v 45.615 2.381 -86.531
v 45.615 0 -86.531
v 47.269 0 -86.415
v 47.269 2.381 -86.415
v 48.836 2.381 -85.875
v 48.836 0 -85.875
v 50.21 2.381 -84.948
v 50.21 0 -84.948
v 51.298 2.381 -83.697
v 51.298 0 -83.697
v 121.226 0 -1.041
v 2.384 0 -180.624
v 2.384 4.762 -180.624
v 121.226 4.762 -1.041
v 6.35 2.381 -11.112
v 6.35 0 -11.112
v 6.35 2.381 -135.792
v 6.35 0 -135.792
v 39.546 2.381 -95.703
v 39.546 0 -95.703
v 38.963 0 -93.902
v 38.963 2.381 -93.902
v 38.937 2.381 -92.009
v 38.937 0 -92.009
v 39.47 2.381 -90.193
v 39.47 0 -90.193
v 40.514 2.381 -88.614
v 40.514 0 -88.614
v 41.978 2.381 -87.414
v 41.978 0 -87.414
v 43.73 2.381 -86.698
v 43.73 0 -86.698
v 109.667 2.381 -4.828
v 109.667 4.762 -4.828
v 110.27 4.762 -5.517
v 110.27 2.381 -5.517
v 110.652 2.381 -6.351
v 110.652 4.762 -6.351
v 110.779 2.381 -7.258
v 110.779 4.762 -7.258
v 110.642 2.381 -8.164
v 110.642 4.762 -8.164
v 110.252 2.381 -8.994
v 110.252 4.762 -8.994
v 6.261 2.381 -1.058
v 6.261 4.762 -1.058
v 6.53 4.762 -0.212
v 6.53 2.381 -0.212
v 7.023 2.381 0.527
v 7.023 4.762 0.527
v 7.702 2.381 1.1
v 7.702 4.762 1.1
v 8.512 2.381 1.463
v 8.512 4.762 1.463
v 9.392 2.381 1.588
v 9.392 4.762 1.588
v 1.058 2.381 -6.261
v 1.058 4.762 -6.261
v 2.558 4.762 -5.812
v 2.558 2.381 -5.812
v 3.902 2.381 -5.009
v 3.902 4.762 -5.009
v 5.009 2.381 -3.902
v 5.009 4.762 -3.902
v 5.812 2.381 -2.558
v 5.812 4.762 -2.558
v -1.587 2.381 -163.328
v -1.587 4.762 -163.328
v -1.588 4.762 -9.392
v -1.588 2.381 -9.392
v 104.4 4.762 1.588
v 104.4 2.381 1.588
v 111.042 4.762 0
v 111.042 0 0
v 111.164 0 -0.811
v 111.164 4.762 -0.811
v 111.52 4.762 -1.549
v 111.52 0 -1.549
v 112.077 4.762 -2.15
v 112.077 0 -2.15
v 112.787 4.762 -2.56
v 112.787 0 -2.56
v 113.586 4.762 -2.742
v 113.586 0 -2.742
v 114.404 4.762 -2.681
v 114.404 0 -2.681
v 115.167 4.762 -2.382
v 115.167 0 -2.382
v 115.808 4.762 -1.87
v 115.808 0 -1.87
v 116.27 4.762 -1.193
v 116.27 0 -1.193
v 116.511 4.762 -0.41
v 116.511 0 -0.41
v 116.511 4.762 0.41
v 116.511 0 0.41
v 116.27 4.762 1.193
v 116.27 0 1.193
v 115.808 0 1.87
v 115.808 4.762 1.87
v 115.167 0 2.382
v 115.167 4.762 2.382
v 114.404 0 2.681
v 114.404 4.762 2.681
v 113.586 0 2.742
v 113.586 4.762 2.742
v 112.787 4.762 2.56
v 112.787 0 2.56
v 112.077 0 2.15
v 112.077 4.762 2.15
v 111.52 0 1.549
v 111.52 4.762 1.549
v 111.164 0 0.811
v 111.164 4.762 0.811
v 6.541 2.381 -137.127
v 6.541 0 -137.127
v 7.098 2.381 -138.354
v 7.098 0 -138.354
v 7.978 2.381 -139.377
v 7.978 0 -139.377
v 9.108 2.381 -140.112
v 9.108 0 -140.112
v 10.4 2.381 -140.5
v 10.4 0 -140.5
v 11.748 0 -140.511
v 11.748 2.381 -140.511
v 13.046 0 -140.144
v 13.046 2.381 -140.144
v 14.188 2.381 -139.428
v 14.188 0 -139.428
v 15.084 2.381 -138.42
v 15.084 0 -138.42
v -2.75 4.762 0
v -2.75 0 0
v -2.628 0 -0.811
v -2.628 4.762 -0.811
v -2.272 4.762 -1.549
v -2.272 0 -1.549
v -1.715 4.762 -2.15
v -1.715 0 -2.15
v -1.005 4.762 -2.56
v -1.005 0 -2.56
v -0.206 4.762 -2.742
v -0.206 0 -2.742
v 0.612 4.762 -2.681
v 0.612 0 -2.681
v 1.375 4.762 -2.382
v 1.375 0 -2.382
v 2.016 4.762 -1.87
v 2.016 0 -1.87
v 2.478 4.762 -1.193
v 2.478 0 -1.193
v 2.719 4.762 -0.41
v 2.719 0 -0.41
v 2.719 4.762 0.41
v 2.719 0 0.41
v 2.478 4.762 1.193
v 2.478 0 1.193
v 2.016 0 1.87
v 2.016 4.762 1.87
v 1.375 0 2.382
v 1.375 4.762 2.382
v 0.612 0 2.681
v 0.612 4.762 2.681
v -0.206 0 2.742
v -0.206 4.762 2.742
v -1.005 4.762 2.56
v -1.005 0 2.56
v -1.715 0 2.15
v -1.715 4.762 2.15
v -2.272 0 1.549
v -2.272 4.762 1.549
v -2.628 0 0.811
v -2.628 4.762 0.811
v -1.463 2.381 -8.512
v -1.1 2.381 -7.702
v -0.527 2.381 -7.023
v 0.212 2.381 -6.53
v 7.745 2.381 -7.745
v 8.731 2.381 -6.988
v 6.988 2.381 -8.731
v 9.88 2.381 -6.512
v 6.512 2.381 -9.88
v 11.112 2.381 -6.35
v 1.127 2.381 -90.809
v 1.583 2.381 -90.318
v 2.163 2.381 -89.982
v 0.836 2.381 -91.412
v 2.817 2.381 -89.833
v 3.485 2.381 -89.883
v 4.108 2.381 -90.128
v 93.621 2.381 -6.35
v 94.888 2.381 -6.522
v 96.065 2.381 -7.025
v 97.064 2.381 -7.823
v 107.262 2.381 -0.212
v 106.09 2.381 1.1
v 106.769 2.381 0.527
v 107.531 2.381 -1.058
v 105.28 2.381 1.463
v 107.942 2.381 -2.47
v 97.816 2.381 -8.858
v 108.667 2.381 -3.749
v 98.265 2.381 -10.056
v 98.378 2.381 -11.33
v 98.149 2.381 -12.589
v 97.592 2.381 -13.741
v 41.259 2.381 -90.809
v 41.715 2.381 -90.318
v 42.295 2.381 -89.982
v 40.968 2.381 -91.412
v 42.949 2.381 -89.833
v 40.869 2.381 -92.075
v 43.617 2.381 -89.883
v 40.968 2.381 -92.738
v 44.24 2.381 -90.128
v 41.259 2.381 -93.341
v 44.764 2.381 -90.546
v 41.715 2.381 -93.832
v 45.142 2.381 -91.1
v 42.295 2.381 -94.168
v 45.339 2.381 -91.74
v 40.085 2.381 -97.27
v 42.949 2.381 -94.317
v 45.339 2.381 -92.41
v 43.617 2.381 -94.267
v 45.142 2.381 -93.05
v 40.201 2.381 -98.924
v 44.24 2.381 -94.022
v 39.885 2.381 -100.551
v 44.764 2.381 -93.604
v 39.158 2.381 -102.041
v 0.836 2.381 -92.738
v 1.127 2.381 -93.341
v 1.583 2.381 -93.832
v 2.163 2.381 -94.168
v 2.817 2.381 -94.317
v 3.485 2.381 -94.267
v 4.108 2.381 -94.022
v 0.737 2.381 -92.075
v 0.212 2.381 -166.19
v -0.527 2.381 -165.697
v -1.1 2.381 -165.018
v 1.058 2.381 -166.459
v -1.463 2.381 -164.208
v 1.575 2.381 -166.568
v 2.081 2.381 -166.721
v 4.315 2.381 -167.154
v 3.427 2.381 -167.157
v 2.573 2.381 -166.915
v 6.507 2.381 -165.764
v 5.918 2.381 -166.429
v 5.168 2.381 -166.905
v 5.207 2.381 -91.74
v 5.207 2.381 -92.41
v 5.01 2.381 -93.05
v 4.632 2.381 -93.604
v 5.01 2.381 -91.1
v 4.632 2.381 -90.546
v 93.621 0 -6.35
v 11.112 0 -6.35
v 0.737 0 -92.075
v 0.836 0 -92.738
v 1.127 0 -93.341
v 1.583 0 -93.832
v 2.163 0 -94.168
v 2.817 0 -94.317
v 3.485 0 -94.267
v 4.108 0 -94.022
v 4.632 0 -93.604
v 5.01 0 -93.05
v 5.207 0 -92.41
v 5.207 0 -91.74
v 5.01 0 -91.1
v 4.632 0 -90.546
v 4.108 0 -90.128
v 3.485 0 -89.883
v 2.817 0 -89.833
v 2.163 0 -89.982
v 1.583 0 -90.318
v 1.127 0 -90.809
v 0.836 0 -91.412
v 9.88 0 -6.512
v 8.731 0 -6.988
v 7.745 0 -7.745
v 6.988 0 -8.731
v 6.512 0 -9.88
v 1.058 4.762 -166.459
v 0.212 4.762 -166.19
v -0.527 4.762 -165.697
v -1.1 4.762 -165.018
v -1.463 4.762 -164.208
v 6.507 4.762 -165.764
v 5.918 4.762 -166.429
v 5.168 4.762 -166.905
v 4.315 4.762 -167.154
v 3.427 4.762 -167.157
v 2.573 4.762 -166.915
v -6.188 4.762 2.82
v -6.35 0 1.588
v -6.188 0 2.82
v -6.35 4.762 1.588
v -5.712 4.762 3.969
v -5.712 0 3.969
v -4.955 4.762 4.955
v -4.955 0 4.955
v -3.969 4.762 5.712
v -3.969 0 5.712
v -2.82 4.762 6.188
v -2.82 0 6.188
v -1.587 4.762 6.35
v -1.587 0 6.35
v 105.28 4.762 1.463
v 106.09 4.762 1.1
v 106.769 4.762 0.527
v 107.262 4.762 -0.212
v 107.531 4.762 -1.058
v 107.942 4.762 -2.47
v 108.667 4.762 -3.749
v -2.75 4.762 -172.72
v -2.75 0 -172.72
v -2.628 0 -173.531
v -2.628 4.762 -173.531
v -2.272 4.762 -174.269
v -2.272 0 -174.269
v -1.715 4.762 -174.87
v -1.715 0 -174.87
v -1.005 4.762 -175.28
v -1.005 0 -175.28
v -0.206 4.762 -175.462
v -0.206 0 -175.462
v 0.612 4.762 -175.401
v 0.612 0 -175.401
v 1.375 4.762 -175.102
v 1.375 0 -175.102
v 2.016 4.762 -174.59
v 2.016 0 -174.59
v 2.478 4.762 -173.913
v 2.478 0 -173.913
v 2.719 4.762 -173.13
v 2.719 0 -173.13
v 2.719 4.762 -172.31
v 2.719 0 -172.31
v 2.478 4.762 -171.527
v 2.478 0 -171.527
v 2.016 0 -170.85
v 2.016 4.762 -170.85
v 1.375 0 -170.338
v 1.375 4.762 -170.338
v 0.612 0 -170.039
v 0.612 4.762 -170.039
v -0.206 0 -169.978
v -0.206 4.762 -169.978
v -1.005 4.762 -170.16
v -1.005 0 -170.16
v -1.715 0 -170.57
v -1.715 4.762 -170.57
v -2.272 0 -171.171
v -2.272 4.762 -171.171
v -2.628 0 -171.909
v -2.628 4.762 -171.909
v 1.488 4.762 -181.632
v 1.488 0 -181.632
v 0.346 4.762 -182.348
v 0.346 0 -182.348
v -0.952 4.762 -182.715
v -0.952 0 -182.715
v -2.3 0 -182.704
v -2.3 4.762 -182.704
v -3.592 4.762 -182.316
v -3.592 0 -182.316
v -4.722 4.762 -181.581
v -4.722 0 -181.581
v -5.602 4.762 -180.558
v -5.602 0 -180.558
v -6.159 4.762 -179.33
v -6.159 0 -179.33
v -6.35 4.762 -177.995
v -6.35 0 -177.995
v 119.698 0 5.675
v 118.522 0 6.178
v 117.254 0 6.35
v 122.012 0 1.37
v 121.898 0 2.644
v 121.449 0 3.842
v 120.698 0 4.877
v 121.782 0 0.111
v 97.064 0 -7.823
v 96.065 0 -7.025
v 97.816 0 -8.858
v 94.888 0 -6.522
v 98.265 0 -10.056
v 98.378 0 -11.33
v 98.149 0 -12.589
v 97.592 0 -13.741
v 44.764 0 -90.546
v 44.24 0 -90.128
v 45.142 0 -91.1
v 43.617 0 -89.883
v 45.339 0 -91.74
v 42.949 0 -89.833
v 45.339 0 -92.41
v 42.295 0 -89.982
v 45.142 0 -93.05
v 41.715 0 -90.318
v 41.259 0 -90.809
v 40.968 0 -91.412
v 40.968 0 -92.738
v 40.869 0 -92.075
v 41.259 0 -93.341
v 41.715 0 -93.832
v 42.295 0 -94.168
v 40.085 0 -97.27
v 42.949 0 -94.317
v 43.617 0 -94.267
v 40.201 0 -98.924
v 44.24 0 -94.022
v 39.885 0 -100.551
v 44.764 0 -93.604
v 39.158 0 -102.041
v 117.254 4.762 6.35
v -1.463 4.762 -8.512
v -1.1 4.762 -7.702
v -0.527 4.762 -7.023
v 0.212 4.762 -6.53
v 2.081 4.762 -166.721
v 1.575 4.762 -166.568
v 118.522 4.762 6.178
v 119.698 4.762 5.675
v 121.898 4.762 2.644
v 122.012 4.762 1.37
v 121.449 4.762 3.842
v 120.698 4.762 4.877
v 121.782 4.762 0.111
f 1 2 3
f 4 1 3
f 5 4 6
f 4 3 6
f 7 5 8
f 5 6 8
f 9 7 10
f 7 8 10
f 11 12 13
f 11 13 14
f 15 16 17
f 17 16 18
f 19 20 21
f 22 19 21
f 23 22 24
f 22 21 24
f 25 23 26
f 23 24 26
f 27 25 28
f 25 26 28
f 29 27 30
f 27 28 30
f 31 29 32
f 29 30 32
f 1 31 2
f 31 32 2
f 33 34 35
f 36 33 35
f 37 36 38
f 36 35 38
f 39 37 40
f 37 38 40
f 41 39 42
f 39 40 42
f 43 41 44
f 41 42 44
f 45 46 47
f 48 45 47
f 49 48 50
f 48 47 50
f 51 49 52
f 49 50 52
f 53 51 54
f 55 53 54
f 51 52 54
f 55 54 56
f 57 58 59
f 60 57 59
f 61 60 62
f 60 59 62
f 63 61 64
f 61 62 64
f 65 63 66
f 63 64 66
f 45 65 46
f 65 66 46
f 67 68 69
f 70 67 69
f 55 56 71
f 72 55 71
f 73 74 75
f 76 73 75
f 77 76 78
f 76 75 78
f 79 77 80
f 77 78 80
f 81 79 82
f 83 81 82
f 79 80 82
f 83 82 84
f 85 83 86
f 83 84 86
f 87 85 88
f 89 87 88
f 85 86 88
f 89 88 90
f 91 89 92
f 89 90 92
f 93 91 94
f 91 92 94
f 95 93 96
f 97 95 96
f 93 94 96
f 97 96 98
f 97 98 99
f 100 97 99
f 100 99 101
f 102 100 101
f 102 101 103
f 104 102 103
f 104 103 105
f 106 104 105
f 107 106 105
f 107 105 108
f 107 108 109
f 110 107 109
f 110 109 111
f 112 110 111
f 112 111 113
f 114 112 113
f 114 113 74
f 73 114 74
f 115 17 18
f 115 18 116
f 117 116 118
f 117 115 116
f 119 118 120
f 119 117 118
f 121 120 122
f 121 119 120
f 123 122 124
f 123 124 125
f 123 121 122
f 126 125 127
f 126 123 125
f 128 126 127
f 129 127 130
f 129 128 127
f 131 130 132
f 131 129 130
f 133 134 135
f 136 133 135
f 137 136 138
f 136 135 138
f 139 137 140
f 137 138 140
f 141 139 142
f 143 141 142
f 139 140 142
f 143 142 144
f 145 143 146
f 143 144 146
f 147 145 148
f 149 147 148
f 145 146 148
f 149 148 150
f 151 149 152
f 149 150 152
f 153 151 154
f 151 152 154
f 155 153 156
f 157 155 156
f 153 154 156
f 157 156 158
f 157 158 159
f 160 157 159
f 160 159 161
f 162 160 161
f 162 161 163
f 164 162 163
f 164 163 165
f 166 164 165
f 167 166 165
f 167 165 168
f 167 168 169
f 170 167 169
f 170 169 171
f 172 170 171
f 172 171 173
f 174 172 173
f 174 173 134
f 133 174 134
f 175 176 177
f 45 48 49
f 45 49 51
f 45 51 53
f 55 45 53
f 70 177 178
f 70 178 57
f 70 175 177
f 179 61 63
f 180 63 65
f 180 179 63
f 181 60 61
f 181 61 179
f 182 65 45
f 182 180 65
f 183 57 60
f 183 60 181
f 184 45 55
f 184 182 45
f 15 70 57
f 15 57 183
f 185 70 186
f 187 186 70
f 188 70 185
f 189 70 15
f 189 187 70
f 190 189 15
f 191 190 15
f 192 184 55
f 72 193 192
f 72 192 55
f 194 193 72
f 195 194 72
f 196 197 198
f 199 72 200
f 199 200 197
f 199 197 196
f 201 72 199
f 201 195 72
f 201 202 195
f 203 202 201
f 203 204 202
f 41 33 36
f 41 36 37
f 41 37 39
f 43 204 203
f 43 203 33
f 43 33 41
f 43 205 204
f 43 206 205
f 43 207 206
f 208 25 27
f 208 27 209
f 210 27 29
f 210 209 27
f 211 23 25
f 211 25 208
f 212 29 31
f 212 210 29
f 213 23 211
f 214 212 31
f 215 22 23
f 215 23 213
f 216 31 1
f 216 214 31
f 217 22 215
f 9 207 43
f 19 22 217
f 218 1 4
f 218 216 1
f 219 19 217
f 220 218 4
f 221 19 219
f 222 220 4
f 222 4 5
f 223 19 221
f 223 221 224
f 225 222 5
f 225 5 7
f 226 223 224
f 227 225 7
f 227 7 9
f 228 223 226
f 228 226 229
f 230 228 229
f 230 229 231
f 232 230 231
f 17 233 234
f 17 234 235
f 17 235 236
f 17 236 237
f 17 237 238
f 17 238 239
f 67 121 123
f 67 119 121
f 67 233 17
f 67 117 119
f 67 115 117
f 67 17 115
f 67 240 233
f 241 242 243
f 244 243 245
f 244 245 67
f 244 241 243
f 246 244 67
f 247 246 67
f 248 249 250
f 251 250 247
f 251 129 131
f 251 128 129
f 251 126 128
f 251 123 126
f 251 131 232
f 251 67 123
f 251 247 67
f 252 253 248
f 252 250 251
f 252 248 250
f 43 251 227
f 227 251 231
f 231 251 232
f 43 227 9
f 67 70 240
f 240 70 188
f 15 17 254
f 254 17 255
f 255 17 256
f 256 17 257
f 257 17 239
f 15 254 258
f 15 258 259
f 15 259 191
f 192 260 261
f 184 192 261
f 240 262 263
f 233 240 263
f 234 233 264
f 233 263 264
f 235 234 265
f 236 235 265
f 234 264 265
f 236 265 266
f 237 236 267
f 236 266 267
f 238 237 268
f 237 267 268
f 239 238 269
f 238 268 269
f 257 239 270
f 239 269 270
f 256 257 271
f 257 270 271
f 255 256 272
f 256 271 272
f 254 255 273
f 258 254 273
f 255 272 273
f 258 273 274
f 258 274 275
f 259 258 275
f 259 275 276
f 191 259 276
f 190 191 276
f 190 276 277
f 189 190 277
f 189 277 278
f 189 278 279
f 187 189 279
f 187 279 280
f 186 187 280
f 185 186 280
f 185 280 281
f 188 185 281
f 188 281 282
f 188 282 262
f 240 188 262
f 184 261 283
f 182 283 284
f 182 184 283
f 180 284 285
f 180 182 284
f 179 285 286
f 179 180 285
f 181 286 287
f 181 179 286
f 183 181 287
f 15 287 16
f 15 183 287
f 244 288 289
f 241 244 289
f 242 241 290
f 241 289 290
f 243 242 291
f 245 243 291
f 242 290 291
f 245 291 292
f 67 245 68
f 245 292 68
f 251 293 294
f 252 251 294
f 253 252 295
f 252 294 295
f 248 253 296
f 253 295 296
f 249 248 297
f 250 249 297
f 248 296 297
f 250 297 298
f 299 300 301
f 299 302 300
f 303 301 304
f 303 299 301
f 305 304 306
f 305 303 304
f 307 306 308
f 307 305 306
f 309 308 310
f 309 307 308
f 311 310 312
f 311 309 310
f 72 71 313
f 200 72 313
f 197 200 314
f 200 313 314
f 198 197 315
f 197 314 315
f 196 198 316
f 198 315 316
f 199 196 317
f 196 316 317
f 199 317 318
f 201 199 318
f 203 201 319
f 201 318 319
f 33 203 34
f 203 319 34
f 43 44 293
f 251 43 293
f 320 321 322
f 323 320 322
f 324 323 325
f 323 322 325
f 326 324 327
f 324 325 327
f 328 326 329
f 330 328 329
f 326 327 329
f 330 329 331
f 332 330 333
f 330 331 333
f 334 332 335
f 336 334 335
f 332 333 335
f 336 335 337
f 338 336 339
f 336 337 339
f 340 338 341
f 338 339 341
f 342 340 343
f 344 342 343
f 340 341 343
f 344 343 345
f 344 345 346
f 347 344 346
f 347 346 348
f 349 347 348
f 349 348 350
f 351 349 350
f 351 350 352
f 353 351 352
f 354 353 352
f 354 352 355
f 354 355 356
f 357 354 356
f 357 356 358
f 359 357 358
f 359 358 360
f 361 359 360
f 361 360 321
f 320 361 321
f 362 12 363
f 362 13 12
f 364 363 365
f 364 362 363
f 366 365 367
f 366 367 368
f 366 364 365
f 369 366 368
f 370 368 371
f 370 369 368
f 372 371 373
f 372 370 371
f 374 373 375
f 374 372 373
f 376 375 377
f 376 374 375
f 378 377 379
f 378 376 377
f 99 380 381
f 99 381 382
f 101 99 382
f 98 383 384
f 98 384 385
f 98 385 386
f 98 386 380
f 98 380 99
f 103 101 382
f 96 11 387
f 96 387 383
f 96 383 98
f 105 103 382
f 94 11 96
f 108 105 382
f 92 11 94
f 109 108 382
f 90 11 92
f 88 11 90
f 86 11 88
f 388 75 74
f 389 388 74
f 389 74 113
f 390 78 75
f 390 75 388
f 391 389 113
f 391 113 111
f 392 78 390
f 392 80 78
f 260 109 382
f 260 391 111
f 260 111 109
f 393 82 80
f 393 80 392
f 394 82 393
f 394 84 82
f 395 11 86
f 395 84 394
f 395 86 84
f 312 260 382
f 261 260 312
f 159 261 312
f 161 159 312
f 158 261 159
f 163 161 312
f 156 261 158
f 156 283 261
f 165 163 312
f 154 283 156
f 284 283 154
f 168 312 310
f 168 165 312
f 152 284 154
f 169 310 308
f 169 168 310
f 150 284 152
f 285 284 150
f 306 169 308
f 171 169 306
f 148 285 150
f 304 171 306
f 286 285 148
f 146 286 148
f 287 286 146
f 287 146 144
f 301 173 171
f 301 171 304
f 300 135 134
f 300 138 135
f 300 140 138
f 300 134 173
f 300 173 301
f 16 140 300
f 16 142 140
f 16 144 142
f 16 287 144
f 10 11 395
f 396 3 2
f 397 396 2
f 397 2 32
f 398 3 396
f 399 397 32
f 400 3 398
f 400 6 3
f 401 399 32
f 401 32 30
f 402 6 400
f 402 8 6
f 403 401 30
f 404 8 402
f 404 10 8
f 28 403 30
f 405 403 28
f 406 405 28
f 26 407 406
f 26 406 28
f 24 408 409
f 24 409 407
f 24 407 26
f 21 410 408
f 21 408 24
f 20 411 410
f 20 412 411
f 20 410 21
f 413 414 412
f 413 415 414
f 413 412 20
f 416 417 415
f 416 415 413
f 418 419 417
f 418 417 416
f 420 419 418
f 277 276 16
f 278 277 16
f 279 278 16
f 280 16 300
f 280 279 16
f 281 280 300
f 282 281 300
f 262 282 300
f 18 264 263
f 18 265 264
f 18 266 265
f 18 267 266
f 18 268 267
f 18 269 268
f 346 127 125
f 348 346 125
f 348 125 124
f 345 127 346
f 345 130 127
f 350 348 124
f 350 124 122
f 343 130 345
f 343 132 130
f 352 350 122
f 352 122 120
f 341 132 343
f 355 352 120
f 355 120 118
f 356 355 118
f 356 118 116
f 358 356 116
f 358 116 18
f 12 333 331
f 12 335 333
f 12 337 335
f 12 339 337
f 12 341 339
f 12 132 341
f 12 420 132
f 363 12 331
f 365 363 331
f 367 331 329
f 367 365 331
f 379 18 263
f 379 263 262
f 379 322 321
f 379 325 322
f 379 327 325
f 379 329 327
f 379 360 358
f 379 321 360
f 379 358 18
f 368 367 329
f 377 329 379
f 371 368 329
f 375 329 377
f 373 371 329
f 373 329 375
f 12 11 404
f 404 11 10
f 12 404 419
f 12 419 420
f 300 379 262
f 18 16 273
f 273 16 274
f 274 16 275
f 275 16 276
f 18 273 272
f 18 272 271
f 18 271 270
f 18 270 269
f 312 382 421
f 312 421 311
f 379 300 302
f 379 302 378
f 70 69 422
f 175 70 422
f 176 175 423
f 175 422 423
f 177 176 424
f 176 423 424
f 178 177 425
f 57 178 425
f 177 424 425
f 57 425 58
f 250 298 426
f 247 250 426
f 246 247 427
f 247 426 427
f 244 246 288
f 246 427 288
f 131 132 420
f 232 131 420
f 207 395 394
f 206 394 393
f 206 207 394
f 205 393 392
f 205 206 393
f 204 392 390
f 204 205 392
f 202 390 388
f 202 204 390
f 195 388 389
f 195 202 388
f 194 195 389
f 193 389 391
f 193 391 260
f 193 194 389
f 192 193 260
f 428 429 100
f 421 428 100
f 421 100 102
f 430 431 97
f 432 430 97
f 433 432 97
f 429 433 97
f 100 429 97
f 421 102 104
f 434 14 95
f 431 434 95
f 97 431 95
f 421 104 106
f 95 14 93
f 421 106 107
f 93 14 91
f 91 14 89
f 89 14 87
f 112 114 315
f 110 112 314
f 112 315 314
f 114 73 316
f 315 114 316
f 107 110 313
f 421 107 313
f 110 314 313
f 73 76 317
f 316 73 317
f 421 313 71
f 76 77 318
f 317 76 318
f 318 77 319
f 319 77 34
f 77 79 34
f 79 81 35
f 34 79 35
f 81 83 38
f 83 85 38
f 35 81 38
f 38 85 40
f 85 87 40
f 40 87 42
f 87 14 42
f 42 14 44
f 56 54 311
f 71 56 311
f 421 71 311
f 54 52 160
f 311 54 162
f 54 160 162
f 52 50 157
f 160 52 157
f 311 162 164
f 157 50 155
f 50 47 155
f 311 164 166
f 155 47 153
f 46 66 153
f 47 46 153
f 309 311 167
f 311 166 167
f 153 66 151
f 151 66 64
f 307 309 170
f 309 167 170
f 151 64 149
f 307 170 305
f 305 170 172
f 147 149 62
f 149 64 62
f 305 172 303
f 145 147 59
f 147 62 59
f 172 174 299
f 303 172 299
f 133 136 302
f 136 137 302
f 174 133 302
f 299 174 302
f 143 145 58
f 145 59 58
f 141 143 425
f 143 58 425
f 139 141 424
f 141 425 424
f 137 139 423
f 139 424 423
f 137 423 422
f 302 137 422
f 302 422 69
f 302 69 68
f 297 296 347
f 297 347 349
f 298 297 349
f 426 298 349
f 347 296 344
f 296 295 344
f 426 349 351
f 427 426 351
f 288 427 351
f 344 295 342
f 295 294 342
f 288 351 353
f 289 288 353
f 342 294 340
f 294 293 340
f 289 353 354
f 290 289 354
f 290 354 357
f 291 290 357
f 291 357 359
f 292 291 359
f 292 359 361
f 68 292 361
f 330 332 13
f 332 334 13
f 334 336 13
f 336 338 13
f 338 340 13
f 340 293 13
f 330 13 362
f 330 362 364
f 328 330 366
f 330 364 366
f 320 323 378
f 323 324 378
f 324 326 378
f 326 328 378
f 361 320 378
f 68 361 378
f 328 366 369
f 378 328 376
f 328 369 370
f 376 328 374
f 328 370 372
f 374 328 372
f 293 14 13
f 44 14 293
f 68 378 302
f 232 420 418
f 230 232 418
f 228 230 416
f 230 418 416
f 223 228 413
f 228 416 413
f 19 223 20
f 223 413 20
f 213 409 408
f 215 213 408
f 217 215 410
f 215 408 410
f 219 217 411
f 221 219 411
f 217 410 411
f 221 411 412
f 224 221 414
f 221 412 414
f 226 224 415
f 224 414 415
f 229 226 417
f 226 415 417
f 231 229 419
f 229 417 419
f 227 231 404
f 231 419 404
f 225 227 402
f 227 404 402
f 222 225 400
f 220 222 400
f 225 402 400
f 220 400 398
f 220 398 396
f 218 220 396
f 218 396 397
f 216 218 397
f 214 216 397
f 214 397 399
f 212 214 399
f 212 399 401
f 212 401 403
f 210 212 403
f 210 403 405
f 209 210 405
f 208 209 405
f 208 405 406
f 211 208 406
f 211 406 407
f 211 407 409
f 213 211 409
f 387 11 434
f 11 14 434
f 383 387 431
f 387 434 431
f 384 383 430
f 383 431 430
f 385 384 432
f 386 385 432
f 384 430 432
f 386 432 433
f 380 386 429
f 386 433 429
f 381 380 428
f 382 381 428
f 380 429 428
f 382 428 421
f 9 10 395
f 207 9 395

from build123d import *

# Parameters (mm, degrees)
BOSS_EXTRUDE1_DEPTH          = 4.7625
FILLET5_R                    = 4.7625
F_97_0_0059_DIAMETER_HOLE1_D = 5.499999922
CUT_EXTRUDE1_DEPTH           = 2.38125
F_8_CLEARANCE_HOLE1_D        = 4.4958


with BuildPart() as part:
    # Sketch1 → Boss-Extrude1 (new body)
    with BuildSketch(Plane(origin=(0, 0, 0), x_dir=(1, 0, 0), z_dir=(0, 1, 0))):
        Polygon((-6.35, 193.821953186), (126.116733726, -6.35), (-6.35, -6.35), align=None)
        with BuildLine():
            Line((51.297931724, 83.696727765), (102.483266274, 6.35))
            Line((102.483266274, 6.35), (6.35, 6.35))
            Line((6.35, 6.35), (6.35, 151.618046814))
            Line((6.35, 151.618046814), (39.158490531, 102.040772235))
            ThreePointArc((39.158490531, 102.040772235), (40.201209552, 98.92354296), (39.545616076, 95.702583707))
            ThreePointArc((39.545616076, 95.702583707), (39.932741621, 89.36439518), (45.615336672, 86.530561472))
            ThreePointArc((45.615336672, 86.530561472), (48.836295925, 85.874967996), (51.297931724, 83.696727765))
        make_face(mode=Mode.SUBTRACT)
    extrude(amount=BOSS_EXTRUDE1_DEPTH)

    # Fillet5
    fillet5_edges = [part.edges().sort_by_distance(p)[0] for p in [
        (6.35, 2.38125, -151.618046814),
        (6.35, 2.38125, -6.35),
        (102.483266274, 2.38125, -6.35),
        (-6.35, 2.38125, -193.821953186),
        (126.116733726, 2.38125, 6.35),
        (-6.35, 2.38125, 6.35),
    ]]
    fillet(fillet5_edges, radius=FILLET5_R)

    # #97 (0.0059) Diameter Hole1 (through all)
    with Locations(Plane(origin=(0, 4.7625, 0), x_dir=(1, 0, 0), z_dir=(0, 1, 0))):
        with Locations((0, 172.72), (0, 0), (113.792, 0)):
            Hole(F_97_0_0059_DIAMETER_HOLE1_D / 2)

    # Sketch5 → Cut-Extrude1 (cut)
    with BuildSketch(Plane(origin=(0, 4.7625, 0), x_dir=(1, 0, 0), z_dir=(0, 1, 0))):
        with BuildLine():
            Line((110.252008963, 8.993563641), (6.506878053, 165.763983683))
            ThreePointArc((6.506878053, 165.763983683), (4.750358466, 167.059159309), (2.5727622, 166.914537515))
            ThreePointArc((2.5727622, 166.914537515), (1.829790785, 166.639344963), (1.058333333, 166.458815563))
            ThreePointArc((1.058333333, 166.458815563), (-0.837446305, 165.377677032), (-1.5875, 163.328223344))
            Line((-1.5875, 163.328223344), (-1.5875, 9.391776656))
            ThreePointArc((-1.5875, 9.391776656), (-0.837446305, 7.342322968), (1.058333333, 6.261184437))
            ThreePointArc((1.058333333, 6.261184437), (4.490128061, 4.490128061), (6.261184437, 1.058333333))
            ThreePointArc((6.261184437, 1.058333333), (7.342322968, -0.837446305), (9.391776656, -1.5875))
            Line((9.391776656, -1.5875), (104.400223344, -1.5875))
            ThreePointArc((104.400223344, -1.5875), (106.449677032, -0.837446305), (107.530815563, 1.058333333))
            ThreePointArc((107.530815563, 1.058333333), (108.267435402, 3.130764444), (109.666849473, 4.827590821))
            ThreePointArc((109.666849473, 4.827590821), (110.748409623, 6.799755727), (110.252008963, 8.993563641))
        make_face()
    extrude(amount=-CUT_EXTRUDE1_DEPTH, mode=Mode.SUBTRACT)

    # #8 Clearance Hole1 (through all)
    with Locations(Plane(origin=(0, 2.38125, 0), x_dir=(1, 0, 0), z_dir=(0, 1, 0))):
        with Locations((2.9845, 92.075), (43.1165, 92.075)):
            Hole(F_8_CLEARANCE_HOLE1_D / 2)


solid = part.part
